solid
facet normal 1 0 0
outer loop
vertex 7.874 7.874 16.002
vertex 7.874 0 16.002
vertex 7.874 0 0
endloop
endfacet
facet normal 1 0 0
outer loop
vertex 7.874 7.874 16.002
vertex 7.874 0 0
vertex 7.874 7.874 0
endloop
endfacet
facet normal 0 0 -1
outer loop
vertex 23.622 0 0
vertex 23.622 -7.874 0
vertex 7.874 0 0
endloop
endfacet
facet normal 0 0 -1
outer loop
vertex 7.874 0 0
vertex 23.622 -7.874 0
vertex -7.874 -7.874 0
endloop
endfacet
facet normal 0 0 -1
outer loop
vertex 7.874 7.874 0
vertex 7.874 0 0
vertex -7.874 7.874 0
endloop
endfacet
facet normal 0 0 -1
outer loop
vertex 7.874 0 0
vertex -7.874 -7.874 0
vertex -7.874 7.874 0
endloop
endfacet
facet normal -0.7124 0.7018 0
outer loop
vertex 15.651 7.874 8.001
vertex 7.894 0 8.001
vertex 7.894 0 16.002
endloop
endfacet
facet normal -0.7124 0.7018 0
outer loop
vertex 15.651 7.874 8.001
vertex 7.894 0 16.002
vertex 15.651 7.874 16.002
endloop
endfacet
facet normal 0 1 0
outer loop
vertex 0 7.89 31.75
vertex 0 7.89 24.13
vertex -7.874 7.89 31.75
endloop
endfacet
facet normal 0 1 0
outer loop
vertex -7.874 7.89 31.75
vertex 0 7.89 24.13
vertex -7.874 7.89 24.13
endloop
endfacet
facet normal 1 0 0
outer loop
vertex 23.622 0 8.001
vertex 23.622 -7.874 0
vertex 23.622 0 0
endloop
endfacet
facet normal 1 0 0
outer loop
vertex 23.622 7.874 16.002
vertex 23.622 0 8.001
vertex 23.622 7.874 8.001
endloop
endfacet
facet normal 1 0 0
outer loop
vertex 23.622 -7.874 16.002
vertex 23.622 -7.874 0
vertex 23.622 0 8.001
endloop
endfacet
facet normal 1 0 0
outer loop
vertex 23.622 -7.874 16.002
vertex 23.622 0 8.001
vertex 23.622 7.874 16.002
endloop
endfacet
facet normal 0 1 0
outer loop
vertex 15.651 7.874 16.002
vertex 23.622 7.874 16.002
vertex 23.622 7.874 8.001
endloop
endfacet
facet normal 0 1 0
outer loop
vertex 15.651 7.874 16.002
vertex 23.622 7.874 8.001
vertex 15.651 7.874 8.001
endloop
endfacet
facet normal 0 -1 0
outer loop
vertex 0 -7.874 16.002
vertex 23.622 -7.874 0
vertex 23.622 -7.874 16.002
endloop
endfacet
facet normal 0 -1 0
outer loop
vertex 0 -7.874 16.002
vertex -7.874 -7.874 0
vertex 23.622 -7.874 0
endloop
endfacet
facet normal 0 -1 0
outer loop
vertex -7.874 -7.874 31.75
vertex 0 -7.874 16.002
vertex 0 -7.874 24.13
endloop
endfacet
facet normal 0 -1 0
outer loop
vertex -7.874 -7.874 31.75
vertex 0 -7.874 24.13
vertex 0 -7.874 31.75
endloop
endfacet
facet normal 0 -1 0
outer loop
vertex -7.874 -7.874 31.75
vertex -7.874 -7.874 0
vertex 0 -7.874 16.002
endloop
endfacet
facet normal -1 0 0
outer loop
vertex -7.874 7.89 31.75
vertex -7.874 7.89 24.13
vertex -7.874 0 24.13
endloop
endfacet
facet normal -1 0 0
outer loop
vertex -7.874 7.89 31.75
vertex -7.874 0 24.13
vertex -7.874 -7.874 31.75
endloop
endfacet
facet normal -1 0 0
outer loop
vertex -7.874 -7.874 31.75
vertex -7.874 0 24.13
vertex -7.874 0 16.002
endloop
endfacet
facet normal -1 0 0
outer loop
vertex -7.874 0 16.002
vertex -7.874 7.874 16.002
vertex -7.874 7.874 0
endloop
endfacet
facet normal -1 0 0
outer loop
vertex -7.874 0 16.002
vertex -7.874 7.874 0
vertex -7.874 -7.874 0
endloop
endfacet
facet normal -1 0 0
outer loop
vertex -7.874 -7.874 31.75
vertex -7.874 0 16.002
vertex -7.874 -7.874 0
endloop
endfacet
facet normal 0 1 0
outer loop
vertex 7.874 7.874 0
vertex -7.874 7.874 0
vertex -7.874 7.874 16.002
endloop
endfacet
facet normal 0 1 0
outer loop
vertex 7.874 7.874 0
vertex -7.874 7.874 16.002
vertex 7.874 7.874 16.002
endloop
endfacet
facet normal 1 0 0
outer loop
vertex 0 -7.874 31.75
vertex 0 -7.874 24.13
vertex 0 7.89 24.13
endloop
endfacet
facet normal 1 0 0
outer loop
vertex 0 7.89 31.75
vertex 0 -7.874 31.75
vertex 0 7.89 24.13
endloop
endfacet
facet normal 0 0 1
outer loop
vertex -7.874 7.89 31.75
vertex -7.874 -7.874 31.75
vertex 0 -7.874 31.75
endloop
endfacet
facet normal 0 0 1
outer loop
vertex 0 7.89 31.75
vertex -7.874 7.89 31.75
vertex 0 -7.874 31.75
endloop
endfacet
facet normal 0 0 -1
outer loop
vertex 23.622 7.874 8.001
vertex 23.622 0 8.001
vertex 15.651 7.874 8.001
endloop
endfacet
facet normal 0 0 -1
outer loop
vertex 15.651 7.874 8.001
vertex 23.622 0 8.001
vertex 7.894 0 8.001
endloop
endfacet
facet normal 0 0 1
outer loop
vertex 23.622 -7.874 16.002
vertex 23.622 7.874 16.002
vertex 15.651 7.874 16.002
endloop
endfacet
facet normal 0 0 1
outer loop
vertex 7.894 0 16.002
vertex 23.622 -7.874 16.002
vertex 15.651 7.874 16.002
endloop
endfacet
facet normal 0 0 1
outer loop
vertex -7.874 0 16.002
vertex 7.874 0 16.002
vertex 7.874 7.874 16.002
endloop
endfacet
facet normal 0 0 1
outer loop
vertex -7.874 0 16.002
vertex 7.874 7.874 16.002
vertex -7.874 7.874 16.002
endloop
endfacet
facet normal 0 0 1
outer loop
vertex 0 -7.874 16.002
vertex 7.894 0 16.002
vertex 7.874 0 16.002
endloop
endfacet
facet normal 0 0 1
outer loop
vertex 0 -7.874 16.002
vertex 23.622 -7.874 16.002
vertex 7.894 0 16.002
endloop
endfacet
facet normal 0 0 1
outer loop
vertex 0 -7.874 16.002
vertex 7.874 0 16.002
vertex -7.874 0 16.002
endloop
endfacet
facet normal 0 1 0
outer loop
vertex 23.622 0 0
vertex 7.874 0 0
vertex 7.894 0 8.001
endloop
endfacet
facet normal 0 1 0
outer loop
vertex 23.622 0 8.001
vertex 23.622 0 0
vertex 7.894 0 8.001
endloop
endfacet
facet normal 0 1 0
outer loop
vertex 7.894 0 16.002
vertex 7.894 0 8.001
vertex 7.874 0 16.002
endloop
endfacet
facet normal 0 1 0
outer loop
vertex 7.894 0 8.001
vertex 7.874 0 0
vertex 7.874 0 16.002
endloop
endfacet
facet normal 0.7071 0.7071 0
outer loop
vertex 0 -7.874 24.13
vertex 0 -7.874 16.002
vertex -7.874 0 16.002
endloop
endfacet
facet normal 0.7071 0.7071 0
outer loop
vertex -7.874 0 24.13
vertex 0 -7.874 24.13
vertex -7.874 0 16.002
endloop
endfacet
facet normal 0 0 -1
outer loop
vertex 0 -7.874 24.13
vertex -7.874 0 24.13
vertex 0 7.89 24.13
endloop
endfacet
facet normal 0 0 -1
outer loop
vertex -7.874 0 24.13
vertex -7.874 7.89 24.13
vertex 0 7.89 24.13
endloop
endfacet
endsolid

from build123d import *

# Parameters (mm, degrees)
F0_W      = 15.748
F0_H      = 15.748
F1_DEPTH  = 16.002
F3_DEPTH  = 8.128
F5_DEPTH  = 7.62
F6_W      = 7.874
F6_H      = 16.002
F7_DEPTH  = 15.748
F8_W      = 7.971476
F8_H      = 8.001
F9_DEPTH  = 7.874
F11_DEPTH = 8.001


with BuildPart() as f1:
    # F0 (on Top) → F1 (new body)
    with BuildSketch(Plane.XY):
        Rectangle(F0_W, F0_H)
    extrude(amount=F1_DEPTH)

    # F2 (on face) → F3 (join)
    with BuildSketch(Plane.XY.offset(16.002)):
        Polygon((0, -7.874), (-7.874, 0), (-7.874, -7.874), align=None)
    extrude(amount=F3_DEPTH)

    # F4 (on face) → F5 (join)
    with BuildSketch(Plane.XY.offset(24.13)):
        Polygon((-7.874, 0), (0, -7.874), (0, 7.889553), (-7.874, 7.889553), align=None)
        Polygon((-7.874, 0), (-7.874, -7.874), (0, -7.874), align=None)
    extrude(amount=F5_DEPTH)

    # F6 (on face) → F7 (join)
    with BuildSketch(Plane.YZ.offset(7.874)):
        with Locations((-3.937, 8.001)):
            Rectangle(F6_W, F6_H)
    extrude(amount=F7_DEPTH)

    # F8 (on face) → F9 (join, through all)
    with BuildSketch(Plane(origin=(0, 0, 0), x_dir=(-1, 0, 0), z_dir=(0, 1, 0))):
        with Locations((-19.636262, 12.0015)):
            Rectangle(F8_W, F8_H)
    extrude(amount=F9_DEPTH)

    # F10 (on face) → F11 (join, through all)
    with BuildSketch(Plane(origin=(0, 0, 8.001), x_dir=(1, 0, 0), z_dir=(0, 0, -1))):
        Polygon((7.865508, 0.029401), (15.650524, -7.874), (15.650524, 0), align=None)
    extrude(amount=-F11_DEPTH)


solid = f1.part
